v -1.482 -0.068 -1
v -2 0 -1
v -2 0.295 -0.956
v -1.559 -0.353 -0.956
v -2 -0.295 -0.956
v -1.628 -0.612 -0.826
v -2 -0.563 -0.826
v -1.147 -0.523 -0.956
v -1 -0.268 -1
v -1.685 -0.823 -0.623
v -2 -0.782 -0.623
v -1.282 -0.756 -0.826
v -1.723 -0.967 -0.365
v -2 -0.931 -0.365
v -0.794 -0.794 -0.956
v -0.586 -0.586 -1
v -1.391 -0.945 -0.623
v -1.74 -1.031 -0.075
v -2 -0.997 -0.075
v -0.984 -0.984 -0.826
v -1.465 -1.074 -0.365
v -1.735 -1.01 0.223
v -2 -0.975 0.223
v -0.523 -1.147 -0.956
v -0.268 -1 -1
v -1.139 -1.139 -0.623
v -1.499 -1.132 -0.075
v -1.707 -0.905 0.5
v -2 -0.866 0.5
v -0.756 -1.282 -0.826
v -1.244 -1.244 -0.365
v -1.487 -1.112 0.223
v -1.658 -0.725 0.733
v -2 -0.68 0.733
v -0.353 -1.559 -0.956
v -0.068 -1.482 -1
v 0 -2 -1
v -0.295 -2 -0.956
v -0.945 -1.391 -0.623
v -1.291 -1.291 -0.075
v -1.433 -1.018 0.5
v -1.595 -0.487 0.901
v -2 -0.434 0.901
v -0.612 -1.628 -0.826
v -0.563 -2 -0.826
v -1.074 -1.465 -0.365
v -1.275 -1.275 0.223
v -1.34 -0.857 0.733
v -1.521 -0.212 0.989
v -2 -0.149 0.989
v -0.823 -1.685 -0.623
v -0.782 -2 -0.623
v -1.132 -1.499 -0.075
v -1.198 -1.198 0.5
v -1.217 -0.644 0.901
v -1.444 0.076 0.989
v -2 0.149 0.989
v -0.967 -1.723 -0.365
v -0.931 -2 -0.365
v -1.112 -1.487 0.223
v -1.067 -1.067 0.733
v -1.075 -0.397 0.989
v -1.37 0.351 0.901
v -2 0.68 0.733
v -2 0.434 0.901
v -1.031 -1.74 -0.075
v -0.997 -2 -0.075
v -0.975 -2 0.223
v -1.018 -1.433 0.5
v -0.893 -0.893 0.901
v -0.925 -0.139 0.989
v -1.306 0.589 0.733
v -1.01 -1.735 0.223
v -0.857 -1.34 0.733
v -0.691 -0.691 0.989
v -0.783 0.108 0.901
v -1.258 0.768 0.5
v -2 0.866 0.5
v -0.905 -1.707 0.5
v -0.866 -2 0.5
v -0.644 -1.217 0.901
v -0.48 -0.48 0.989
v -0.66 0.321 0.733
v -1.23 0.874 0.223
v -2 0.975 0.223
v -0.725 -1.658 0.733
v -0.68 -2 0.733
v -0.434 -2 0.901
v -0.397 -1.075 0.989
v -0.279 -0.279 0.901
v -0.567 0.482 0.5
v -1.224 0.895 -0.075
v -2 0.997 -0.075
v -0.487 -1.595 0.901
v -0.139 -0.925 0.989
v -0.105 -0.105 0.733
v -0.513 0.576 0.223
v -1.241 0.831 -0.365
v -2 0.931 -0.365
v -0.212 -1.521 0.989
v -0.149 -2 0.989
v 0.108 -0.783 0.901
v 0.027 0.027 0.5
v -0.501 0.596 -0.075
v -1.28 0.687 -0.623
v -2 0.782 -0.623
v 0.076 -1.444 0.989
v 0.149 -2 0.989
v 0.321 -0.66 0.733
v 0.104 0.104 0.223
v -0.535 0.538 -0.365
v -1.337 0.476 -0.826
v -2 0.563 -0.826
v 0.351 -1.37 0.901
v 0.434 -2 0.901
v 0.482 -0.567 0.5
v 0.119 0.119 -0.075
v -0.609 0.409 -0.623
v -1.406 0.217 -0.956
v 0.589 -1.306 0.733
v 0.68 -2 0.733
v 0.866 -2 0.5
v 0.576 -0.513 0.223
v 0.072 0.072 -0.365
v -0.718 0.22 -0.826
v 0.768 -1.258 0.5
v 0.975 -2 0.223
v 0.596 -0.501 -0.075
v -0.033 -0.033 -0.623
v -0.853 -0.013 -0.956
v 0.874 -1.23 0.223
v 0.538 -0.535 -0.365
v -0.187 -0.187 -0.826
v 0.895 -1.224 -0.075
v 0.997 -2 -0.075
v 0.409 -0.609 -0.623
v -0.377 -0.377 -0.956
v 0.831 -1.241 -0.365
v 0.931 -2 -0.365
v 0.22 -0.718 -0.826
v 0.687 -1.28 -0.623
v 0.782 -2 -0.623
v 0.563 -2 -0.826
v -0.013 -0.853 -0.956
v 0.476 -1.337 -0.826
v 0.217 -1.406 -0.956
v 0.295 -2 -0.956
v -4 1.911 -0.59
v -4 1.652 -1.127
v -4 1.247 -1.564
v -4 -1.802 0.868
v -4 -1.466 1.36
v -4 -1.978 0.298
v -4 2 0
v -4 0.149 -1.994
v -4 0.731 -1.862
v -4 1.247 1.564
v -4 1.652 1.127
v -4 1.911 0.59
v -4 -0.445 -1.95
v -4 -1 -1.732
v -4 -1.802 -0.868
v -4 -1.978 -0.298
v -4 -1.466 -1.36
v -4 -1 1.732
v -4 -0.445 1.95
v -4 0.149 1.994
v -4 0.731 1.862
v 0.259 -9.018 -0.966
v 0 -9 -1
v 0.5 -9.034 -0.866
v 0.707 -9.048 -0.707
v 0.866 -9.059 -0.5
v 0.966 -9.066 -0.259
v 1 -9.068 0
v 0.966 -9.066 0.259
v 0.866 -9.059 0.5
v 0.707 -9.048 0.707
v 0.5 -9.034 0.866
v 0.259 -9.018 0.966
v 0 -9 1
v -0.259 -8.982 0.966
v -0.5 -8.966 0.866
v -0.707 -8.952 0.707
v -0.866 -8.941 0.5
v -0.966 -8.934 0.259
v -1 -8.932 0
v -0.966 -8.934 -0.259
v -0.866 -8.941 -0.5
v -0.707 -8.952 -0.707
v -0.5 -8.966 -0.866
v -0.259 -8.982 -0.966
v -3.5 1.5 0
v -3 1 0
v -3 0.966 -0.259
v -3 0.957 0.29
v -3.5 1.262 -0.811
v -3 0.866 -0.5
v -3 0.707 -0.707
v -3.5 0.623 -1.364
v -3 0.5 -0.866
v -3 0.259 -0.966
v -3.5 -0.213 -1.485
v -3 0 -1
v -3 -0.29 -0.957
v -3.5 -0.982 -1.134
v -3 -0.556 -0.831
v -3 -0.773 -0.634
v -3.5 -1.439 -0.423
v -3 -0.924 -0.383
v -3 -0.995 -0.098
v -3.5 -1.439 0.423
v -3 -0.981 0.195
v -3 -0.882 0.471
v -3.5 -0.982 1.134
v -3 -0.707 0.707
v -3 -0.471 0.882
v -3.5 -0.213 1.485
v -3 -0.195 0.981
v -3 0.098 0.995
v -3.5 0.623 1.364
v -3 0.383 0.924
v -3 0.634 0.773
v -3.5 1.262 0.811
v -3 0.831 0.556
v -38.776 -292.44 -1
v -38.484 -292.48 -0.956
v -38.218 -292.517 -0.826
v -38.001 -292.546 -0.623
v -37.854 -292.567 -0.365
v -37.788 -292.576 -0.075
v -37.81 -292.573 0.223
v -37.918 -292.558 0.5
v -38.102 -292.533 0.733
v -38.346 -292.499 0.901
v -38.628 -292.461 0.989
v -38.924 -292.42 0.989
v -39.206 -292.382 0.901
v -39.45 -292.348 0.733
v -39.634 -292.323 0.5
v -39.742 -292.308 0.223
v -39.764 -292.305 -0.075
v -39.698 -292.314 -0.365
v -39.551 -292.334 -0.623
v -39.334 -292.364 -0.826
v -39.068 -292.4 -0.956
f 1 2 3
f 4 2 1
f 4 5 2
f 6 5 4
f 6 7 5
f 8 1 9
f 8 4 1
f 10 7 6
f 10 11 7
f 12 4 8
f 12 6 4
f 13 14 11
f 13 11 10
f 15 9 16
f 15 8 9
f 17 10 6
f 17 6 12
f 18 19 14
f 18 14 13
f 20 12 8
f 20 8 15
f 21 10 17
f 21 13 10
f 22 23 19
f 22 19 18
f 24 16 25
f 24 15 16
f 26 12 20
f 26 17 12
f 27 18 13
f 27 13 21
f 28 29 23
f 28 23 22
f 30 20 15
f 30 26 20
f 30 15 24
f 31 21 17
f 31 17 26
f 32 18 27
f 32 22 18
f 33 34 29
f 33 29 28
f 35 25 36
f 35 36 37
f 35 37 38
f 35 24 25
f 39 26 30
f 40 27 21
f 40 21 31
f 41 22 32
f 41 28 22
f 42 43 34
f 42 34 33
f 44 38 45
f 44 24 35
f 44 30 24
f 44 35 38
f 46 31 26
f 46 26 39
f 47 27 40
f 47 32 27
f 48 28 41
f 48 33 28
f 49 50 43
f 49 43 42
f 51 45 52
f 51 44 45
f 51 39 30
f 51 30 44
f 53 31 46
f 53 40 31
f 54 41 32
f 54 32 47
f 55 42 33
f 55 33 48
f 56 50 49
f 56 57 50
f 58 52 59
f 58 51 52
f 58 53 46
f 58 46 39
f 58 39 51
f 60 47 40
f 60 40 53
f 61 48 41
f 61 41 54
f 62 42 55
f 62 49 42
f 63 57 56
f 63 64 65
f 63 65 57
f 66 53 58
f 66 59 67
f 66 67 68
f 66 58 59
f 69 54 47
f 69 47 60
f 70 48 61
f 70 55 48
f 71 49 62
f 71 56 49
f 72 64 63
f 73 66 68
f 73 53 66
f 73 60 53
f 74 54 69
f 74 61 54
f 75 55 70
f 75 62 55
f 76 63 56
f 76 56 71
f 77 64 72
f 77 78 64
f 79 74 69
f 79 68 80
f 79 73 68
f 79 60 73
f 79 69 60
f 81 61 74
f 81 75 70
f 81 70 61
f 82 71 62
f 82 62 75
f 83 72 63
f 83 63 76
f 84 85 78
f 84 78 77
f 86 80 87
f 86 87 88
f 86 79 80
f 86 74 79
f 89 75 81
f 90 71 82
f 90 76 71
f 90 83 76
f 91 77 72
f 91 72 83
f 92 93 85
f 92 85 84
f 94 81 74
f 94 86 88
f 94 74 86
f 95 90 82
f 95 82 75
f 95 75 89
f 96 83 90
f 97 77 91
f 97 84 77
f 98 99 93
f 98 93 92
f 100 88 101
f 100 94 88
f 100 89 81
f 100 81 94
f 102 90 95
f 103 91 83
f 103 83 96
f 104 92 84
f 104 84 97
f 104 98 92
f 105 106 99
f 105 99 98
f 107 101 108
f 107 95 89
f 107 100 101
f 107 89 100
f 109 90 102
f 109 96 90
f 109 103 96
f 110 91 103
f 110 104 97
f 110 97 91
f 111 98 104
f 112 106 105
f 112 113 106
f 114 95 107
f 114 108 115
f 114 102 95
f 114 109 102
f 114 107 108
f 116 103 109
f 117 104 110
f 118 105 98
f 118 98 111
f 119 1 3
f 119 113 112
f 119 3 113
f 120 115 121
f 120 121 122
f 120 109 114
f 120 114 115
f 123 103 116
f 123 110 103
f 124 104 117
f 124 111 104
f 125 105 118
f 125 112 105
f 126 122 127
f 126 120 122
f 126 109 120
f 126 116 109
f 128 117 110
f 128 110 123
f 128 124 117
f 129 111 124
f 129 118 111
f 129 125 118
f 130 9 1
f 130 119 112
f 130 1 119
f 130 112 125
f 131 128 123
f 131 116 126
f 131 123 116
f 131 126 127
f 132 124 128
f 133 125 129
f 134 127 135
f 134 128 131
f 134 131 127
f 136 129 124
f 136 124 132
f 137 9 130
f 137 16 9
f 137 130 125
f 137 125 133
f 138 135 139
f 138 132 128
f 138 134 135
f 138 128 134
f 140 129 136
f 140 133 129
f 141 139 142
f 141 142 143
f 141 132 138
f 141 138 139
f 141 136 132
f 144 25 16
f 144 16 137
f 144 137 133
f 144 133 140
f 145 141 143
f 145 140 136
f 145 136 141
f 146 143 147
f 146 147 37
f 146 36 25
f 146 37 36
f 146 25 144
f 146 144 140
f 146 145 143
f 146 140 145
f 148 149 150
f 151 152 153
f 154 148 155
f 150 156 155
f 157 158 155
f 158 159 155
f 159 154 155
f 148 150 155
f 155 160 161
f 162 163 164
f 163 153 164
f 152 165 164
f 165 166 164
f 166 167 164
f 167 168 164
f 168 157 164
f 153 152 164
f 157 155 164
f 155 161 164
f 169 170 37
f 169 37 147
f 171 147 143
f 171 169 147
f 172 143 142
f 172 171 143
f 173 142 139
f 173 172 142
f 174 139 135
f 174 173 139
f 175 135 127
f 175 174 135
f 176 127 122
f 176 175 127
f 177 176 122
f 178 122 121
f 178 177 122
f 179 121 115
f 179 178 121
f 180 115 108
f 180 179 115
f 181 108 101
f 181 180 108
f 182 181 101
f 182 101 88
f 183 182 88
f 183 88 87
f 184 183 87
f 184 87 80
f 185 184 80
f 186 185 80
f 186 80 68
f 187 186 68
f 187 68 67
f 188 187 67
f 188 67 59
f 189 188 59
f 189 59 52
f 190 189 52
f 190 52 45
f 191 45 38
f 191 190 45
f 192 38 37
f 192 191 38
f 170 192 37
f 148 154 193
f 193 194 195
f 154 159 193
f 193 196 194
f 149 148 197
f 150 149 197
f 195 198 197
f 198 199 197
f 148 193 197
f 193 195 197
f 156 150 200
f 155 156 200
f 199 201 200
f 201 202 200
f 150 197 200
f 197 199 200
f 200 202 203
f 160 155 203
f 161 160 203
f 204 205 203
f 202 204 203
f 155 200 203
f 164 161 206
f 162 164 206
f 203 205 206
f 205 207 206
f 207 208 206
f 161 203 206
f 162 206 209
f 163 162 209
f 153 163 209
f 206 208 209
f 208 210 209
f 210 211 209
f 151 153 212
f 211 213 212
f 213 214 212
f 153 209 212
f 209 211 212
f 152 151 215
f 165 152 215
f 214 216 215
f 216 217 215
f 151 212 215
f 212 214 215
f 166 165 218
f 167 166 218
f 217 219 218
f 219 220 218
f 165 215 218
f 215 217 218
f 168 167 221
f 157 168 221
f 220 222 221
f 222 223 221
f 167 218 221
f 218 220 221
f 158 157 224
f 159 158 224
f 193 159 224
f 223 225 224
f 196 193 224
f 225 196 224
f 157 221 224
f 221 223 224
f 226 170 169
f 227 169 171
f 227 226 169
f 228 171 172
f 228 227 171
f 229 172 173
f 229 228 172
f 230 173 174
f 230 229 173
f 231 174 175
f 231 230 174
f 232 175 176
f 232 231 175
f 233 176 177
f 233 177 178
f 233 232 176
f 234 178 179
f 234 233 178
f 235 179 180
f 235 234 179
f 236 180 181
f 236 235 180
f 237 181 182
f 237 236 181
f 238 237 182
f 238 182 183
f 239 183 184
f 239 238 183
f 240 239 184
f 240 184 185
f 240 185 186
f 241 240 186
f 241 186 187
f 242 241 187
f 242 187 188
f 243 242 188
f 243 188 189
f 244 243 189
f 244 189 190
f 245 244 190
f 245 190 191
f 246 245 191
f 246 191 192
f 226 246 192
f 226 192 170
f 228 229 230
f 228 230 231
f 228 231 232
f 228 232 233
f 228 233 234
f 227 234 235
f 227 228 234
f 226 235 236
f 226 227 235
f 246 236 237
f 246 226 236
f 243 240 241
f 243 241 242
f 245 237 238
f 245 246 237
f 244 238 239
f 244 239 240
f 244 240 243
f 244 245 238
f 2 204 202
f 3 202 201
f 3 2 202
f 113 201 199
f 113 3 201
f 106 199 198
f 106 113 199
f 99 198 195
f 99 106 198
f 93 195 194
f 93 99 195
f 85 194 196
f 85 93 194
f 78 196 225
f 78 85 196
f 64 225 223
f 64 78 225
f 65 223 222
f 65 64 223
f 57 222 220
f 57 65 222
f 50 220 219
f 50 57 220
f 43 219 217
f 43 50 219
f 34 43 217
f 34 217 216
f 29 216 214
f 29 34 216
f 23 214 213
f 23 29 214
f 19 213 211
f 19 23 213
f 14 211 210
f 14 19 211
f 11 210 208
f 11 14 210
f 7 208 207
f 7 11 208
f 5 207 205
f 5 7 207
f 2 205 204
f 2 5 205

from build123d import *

# Parameters (mm, degrees)
ESQUISSE2_R = 1


with BuildPart() as part:
    # Balayage1: sweep along a path in Esquisse1
    with BuildLine(Plane.XY) as balayage1_path:
        Line((-4, 0), (-2, 0))
        ThreePointArc((-2, 0), (-0.585786438, -0.585786438), (0, -2))
        Line((0, -2), (0, -9))
        Line((0, -9), (-38.776114355, -292.440443433))
    # Esquisse2 → Balayage1 (sweep)
    with BuildSketch(Plane(origin=(-4, 0, 0), x_dir=(0, 0, -1), z_dir=(1, 0, 0))):
        Circle(ESQUISSE2_R)
    sweep(path=balayage1_path.line, transition=Transition.RIGHT)

    # Esquisse3 → Révolution1 (revolve)
    with BuildSketch(Plane.XY):
        Polygon((-4, 1), (-4, 2), (-3, 1), align=None)
    revolve(axis=Axis((0, 0, 0), (-1, 0, 0)))


solid = part.part
